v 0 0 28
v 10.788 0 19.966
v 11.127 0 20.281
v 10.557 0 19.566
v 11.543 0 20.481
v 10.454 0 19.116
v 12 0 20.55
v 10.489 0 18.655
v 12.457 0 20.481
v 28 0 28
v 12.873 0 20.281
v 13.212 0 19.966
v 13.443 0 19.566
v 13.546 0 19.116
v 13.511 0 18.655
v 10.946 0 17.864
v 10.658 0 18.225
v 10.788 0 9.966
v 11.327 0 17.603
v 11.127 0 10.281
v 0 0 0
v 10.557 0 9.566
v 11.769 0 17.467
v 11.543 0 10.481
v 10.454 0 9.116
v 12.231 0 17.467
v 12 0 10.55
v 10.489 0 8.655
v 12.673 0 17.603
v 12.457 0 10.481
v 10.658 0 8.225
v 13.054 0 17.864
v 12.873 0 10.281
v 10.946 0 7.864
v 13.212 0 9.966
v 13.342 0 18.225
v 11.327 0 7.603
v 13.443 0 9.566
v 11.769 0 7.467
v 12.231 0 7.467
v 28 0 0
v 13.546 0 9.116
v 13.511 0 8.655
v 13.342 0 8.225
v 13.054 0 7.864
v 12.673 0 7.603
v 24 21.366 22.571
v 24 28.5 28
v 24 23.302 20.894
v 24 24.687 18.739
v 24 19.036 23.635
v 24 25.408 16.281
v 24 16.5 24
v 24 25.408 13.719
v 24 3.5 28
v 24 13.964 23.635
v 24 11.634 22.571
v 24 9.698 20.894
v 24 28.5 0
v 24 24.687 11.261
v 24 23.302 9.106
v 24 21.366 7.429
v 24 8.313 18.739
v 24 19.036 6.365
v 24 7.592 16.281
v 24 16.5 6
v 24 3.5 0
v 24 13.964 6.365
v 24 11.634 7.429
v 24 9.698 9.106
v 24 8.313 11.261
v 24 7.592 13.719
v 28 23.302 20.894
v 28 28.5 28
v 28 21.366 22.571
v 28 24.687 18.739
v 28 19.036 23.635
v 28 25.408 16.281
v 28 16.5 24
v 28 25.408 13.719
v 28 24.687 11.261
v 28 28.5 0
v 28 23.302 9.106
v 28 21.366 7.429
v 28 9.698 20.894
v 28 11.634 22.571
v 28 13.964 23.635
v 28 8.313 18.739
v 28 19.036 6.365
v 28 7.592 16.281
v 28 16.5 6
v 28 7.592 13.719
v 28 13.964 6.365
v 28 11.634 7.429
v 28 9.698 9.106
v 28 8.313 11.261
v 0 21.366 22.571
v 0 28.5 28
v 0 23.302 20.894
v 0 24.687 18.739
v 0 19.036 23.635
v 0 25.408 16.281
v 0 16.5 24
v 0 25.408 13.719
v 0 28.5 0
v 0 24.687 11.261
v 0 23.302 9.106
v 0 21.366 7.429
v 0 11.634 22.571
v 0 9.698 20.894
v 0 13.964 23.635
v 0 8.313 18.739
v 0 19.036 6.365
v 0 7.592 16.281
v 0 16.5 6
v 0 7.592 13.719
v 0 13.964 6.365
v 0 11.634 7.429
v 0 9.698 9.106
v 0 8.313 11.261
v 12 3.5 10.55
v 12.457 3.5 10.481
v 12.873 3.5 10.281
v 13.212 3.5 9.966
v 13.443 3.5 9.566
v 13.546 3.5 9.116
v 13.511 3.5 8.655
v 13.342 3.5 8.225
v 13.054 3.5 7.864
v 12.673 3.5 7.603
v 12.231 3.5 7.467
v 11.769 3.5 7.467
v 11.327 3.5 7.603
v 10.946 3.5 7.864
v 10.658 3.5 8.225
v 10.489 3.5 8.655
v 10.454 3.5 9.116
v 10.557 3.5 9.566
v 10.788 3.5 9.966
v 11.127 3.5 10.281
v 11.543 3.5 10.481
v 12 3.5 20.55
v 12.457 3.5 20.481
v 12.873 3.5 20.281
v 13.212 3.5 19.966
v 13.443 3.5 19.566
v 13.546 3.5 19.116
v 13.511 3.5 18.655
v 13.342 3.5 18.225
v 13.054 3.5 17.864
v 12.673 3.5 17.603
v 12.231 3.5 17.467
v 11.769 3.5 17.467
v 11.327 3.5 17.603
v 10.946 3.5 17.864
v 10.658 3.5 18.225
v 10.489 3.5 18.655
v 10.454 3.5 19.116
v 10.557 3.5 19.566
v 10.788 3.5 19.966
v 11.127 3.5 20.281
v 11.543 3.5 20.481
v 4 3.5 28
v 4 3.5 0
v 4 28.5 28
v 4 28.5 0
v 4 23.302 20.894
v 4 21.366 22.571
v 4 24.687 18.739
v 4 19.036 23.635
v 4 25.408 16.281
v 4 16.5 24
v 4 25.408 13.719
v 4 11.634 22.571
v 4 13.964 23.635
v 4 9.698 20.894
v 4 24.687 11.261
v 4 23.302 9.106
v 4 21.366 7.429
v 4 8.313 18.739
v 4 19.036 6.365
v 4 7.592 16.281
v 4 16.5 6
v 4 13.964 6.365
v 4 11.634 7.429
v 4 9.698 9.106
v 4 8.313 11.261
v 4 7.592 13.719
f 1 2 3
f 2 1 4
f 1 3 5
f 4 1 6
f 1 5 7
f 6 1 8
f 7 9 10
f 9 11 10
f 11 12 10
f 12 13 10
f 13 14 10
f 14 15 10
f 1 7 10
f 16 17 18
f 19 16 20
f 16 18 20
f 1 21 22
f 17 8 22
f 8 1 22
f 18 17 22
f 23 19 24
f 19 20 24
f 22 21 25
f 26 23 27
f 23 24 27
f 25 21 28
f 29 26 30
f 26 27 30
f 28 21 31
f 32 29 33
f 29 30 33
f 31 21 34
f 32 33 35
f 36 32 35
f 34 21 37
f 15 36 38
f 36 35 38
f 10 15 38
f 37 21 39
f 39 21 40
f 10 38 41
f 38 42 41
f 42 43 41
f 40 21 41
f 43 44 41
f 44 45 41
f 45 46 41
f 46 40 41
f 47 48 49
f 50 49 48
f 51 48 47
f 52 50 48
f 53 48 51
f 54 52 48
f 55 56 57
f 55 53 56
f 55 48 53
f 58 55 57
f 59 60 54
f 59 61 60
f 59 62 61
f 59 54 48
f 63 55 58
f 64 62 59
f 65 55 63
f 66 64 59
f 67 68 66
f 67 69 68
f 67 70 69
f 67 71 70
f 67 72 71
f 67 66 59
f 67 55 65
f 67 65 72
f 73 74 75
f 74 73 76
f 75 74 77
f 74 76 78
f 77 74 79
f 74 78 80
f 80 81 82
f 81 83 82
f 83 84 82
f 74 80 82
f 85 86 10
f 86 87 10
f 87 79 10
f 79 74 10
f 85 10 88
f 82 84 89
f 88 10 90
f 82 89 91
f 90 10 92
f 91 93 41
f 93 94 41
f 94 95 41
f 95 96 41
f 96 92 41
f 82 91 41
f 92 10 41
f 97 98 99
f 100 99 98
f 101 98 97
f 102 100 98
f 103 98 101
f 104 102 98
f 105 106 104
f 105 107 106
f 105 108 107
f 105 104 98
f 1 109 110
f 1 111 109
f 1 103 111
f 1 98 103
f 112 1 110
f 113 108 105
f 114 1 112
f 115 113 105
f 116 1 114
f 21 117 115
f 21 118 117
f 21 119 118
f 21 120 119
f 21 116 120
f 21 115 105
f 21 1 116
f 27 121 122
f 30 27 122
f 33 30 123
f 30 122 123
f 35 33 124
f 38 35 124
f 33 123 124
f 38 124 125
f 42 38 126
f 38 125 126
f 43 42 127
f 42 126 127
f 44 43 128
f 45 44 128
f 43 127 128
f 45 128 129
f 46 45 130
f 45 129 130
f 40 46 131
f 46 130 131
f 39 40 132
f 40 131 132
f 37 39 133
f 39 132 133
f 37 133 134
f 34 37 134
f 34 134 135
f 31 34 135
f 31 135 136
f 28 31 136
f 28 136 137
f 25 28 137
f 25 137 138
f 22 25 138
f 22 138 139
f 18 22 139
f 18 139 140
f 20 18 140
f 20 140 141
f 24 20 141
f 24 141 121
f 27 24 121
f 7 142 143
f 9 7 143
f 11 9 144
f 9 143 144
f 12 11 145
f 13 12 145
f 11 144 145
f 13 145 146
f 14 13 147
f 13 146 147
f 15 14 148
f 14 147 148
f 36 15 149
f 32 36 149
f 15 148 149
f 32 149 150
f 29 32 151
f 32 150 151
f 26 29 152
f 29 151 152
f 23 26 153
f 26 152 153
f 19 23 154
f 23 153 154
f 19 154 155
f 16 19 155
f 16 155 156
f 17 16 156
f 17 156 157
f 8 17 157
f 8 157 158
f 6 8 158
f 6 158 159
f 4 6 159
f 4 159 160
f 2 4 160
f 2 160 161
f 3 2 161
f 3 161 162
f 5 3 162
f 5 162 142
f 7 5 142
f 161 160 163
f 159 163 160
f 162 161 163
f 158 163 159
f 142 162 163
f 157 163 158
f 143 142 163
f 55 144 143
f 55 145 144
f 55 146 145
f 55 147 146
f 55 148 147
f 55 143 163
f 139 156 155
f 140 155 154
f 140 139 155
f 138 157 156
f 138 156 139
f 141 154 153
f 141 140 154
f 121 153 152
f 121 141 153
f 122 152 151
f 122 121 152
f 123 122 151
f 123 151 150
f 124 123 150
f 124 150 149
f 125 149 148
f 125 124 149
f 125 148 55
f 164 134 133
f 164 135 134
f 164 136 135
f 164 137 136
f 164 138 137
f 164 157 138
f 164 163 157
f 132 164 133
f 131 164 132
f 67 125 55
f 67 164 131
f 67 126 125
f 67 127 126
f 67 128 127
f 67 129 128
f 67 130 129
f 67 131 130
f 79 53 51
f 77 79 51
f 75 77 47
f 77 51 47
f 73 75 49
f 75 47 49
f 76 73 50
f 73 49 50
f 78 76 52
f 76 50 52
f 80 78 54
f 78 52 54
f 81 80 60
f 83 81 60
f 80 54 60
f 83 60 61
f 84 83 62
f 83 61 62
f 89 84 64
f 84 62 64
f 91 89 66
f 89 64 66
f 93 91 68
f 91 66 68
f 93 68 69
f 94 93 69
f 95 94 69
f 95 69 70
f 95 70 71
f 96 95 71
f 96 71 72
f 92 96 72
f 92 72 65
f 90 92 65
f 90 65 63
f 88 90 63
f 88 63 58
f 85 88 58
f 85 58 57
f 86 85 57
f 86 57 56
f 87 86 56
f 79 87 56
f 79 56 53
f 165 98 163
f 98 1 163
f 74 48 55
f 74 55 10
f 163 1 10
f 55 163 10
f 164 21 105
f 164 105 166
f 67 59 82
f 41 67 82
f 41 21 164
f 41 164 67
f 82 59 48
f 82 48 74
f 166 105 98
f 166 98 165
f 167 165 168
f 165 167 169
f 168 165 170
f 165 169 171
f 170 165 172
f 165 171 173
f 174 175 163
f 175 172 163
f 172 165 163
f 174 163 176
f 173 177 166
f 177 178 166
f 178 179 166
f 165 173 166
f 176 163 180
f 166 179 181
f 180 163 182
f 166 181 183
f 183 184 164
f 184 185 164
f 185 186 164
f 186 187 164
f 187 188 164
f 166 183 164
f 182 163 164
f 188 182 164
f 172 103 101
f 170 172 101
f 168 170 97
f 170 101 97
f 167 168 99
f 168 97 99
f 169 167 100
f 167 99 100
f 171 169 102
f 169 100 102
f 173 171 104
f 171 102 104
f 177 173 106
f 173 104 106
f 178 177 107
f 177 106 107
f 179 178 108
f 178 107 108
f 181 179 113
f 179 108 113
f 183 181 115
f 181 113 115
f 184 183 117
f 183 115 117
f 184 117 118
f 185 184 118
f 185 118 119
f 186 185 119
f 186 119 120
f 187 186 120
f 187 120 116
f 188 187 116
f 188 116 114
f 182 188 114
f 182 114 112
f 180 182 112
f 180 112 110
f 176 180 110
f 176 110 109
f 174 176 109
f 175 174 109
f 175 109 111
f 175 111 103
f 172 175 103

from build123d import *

# Parameters (mm, degrees)
SKETCH_1_W          = 28
SKETCH_1_H          = 28
EXTRUDE_1_DEPTH     = 3.5
SKETCH_2_W          = 4
SKETCH_2_H          = 28
EXTRUDE_2_DEPTH     = 25
SKETCH_3_R          = 9
CUT_EXTRUDE_1_DEPTH = 50
SKETCH_4_R          = 1.55
CUT_EXTRUDE_2_DEPTH = 50


with BuildPart() as part:
    # 草图1 → 凸台-拉伸1 (new body)
    with BuildSketch(Plane(origin=(0, 0, 0), x_dir=(1, 0, 0), z_dir=(0, 1, 0))):
        with Locations((14, -14)):
            Rectangle(SKETCH_1_W, SKETCH_1_H)
    extrude(amount=EXTRUDE_1_DEPTH)

    # 草图2 → 凸台-拉伸2 (add)
    with BuildSketch(Plane(origin=(0, 3.5, 0), x_dir=(1, 0, 0), z_dir=(0, 1, 0))):
        with Locations((2, -14)):
            Rectangle(SKETCH_2_W, SKETCH_2_H)
        with Locations((26, -14)):
            Rectangle(SKETCH_2_W, SKETCH_2_H)
    extrude(amount=EXTRUDE_2_DEPTH)

    # 草图3 → 切除-拉伸1 (cut)
    with BuildSketch(Plane.ZY):
        with Locations((15, 16.5)):
            Circle(SKETCH_3_R)
    extrude(amount=-CUT_EXTRUDE_1_DEPTH, mode=Mode.SUBTRACT)

    # 草图4 → 切除-拉伸2 (cut)
    with BuildSketch(Plane(origin=(0, 3.5, 0), x_dir=(1, 0, 0), z_dir=(0, 1, 0))):
        with Locations(Location((12, -19, 0), (0, 0, 270))):
            Circle(SKETCH_4_R)
        with Locations(Location((12, -9, 0), (0, 0, 270))):
            Circle(SKETCH_4_R)
    extrude(amount=-CUT_EXTRUDE_2_DEPTH, mode=Mode.SUBTRACT)


solid = part.part
